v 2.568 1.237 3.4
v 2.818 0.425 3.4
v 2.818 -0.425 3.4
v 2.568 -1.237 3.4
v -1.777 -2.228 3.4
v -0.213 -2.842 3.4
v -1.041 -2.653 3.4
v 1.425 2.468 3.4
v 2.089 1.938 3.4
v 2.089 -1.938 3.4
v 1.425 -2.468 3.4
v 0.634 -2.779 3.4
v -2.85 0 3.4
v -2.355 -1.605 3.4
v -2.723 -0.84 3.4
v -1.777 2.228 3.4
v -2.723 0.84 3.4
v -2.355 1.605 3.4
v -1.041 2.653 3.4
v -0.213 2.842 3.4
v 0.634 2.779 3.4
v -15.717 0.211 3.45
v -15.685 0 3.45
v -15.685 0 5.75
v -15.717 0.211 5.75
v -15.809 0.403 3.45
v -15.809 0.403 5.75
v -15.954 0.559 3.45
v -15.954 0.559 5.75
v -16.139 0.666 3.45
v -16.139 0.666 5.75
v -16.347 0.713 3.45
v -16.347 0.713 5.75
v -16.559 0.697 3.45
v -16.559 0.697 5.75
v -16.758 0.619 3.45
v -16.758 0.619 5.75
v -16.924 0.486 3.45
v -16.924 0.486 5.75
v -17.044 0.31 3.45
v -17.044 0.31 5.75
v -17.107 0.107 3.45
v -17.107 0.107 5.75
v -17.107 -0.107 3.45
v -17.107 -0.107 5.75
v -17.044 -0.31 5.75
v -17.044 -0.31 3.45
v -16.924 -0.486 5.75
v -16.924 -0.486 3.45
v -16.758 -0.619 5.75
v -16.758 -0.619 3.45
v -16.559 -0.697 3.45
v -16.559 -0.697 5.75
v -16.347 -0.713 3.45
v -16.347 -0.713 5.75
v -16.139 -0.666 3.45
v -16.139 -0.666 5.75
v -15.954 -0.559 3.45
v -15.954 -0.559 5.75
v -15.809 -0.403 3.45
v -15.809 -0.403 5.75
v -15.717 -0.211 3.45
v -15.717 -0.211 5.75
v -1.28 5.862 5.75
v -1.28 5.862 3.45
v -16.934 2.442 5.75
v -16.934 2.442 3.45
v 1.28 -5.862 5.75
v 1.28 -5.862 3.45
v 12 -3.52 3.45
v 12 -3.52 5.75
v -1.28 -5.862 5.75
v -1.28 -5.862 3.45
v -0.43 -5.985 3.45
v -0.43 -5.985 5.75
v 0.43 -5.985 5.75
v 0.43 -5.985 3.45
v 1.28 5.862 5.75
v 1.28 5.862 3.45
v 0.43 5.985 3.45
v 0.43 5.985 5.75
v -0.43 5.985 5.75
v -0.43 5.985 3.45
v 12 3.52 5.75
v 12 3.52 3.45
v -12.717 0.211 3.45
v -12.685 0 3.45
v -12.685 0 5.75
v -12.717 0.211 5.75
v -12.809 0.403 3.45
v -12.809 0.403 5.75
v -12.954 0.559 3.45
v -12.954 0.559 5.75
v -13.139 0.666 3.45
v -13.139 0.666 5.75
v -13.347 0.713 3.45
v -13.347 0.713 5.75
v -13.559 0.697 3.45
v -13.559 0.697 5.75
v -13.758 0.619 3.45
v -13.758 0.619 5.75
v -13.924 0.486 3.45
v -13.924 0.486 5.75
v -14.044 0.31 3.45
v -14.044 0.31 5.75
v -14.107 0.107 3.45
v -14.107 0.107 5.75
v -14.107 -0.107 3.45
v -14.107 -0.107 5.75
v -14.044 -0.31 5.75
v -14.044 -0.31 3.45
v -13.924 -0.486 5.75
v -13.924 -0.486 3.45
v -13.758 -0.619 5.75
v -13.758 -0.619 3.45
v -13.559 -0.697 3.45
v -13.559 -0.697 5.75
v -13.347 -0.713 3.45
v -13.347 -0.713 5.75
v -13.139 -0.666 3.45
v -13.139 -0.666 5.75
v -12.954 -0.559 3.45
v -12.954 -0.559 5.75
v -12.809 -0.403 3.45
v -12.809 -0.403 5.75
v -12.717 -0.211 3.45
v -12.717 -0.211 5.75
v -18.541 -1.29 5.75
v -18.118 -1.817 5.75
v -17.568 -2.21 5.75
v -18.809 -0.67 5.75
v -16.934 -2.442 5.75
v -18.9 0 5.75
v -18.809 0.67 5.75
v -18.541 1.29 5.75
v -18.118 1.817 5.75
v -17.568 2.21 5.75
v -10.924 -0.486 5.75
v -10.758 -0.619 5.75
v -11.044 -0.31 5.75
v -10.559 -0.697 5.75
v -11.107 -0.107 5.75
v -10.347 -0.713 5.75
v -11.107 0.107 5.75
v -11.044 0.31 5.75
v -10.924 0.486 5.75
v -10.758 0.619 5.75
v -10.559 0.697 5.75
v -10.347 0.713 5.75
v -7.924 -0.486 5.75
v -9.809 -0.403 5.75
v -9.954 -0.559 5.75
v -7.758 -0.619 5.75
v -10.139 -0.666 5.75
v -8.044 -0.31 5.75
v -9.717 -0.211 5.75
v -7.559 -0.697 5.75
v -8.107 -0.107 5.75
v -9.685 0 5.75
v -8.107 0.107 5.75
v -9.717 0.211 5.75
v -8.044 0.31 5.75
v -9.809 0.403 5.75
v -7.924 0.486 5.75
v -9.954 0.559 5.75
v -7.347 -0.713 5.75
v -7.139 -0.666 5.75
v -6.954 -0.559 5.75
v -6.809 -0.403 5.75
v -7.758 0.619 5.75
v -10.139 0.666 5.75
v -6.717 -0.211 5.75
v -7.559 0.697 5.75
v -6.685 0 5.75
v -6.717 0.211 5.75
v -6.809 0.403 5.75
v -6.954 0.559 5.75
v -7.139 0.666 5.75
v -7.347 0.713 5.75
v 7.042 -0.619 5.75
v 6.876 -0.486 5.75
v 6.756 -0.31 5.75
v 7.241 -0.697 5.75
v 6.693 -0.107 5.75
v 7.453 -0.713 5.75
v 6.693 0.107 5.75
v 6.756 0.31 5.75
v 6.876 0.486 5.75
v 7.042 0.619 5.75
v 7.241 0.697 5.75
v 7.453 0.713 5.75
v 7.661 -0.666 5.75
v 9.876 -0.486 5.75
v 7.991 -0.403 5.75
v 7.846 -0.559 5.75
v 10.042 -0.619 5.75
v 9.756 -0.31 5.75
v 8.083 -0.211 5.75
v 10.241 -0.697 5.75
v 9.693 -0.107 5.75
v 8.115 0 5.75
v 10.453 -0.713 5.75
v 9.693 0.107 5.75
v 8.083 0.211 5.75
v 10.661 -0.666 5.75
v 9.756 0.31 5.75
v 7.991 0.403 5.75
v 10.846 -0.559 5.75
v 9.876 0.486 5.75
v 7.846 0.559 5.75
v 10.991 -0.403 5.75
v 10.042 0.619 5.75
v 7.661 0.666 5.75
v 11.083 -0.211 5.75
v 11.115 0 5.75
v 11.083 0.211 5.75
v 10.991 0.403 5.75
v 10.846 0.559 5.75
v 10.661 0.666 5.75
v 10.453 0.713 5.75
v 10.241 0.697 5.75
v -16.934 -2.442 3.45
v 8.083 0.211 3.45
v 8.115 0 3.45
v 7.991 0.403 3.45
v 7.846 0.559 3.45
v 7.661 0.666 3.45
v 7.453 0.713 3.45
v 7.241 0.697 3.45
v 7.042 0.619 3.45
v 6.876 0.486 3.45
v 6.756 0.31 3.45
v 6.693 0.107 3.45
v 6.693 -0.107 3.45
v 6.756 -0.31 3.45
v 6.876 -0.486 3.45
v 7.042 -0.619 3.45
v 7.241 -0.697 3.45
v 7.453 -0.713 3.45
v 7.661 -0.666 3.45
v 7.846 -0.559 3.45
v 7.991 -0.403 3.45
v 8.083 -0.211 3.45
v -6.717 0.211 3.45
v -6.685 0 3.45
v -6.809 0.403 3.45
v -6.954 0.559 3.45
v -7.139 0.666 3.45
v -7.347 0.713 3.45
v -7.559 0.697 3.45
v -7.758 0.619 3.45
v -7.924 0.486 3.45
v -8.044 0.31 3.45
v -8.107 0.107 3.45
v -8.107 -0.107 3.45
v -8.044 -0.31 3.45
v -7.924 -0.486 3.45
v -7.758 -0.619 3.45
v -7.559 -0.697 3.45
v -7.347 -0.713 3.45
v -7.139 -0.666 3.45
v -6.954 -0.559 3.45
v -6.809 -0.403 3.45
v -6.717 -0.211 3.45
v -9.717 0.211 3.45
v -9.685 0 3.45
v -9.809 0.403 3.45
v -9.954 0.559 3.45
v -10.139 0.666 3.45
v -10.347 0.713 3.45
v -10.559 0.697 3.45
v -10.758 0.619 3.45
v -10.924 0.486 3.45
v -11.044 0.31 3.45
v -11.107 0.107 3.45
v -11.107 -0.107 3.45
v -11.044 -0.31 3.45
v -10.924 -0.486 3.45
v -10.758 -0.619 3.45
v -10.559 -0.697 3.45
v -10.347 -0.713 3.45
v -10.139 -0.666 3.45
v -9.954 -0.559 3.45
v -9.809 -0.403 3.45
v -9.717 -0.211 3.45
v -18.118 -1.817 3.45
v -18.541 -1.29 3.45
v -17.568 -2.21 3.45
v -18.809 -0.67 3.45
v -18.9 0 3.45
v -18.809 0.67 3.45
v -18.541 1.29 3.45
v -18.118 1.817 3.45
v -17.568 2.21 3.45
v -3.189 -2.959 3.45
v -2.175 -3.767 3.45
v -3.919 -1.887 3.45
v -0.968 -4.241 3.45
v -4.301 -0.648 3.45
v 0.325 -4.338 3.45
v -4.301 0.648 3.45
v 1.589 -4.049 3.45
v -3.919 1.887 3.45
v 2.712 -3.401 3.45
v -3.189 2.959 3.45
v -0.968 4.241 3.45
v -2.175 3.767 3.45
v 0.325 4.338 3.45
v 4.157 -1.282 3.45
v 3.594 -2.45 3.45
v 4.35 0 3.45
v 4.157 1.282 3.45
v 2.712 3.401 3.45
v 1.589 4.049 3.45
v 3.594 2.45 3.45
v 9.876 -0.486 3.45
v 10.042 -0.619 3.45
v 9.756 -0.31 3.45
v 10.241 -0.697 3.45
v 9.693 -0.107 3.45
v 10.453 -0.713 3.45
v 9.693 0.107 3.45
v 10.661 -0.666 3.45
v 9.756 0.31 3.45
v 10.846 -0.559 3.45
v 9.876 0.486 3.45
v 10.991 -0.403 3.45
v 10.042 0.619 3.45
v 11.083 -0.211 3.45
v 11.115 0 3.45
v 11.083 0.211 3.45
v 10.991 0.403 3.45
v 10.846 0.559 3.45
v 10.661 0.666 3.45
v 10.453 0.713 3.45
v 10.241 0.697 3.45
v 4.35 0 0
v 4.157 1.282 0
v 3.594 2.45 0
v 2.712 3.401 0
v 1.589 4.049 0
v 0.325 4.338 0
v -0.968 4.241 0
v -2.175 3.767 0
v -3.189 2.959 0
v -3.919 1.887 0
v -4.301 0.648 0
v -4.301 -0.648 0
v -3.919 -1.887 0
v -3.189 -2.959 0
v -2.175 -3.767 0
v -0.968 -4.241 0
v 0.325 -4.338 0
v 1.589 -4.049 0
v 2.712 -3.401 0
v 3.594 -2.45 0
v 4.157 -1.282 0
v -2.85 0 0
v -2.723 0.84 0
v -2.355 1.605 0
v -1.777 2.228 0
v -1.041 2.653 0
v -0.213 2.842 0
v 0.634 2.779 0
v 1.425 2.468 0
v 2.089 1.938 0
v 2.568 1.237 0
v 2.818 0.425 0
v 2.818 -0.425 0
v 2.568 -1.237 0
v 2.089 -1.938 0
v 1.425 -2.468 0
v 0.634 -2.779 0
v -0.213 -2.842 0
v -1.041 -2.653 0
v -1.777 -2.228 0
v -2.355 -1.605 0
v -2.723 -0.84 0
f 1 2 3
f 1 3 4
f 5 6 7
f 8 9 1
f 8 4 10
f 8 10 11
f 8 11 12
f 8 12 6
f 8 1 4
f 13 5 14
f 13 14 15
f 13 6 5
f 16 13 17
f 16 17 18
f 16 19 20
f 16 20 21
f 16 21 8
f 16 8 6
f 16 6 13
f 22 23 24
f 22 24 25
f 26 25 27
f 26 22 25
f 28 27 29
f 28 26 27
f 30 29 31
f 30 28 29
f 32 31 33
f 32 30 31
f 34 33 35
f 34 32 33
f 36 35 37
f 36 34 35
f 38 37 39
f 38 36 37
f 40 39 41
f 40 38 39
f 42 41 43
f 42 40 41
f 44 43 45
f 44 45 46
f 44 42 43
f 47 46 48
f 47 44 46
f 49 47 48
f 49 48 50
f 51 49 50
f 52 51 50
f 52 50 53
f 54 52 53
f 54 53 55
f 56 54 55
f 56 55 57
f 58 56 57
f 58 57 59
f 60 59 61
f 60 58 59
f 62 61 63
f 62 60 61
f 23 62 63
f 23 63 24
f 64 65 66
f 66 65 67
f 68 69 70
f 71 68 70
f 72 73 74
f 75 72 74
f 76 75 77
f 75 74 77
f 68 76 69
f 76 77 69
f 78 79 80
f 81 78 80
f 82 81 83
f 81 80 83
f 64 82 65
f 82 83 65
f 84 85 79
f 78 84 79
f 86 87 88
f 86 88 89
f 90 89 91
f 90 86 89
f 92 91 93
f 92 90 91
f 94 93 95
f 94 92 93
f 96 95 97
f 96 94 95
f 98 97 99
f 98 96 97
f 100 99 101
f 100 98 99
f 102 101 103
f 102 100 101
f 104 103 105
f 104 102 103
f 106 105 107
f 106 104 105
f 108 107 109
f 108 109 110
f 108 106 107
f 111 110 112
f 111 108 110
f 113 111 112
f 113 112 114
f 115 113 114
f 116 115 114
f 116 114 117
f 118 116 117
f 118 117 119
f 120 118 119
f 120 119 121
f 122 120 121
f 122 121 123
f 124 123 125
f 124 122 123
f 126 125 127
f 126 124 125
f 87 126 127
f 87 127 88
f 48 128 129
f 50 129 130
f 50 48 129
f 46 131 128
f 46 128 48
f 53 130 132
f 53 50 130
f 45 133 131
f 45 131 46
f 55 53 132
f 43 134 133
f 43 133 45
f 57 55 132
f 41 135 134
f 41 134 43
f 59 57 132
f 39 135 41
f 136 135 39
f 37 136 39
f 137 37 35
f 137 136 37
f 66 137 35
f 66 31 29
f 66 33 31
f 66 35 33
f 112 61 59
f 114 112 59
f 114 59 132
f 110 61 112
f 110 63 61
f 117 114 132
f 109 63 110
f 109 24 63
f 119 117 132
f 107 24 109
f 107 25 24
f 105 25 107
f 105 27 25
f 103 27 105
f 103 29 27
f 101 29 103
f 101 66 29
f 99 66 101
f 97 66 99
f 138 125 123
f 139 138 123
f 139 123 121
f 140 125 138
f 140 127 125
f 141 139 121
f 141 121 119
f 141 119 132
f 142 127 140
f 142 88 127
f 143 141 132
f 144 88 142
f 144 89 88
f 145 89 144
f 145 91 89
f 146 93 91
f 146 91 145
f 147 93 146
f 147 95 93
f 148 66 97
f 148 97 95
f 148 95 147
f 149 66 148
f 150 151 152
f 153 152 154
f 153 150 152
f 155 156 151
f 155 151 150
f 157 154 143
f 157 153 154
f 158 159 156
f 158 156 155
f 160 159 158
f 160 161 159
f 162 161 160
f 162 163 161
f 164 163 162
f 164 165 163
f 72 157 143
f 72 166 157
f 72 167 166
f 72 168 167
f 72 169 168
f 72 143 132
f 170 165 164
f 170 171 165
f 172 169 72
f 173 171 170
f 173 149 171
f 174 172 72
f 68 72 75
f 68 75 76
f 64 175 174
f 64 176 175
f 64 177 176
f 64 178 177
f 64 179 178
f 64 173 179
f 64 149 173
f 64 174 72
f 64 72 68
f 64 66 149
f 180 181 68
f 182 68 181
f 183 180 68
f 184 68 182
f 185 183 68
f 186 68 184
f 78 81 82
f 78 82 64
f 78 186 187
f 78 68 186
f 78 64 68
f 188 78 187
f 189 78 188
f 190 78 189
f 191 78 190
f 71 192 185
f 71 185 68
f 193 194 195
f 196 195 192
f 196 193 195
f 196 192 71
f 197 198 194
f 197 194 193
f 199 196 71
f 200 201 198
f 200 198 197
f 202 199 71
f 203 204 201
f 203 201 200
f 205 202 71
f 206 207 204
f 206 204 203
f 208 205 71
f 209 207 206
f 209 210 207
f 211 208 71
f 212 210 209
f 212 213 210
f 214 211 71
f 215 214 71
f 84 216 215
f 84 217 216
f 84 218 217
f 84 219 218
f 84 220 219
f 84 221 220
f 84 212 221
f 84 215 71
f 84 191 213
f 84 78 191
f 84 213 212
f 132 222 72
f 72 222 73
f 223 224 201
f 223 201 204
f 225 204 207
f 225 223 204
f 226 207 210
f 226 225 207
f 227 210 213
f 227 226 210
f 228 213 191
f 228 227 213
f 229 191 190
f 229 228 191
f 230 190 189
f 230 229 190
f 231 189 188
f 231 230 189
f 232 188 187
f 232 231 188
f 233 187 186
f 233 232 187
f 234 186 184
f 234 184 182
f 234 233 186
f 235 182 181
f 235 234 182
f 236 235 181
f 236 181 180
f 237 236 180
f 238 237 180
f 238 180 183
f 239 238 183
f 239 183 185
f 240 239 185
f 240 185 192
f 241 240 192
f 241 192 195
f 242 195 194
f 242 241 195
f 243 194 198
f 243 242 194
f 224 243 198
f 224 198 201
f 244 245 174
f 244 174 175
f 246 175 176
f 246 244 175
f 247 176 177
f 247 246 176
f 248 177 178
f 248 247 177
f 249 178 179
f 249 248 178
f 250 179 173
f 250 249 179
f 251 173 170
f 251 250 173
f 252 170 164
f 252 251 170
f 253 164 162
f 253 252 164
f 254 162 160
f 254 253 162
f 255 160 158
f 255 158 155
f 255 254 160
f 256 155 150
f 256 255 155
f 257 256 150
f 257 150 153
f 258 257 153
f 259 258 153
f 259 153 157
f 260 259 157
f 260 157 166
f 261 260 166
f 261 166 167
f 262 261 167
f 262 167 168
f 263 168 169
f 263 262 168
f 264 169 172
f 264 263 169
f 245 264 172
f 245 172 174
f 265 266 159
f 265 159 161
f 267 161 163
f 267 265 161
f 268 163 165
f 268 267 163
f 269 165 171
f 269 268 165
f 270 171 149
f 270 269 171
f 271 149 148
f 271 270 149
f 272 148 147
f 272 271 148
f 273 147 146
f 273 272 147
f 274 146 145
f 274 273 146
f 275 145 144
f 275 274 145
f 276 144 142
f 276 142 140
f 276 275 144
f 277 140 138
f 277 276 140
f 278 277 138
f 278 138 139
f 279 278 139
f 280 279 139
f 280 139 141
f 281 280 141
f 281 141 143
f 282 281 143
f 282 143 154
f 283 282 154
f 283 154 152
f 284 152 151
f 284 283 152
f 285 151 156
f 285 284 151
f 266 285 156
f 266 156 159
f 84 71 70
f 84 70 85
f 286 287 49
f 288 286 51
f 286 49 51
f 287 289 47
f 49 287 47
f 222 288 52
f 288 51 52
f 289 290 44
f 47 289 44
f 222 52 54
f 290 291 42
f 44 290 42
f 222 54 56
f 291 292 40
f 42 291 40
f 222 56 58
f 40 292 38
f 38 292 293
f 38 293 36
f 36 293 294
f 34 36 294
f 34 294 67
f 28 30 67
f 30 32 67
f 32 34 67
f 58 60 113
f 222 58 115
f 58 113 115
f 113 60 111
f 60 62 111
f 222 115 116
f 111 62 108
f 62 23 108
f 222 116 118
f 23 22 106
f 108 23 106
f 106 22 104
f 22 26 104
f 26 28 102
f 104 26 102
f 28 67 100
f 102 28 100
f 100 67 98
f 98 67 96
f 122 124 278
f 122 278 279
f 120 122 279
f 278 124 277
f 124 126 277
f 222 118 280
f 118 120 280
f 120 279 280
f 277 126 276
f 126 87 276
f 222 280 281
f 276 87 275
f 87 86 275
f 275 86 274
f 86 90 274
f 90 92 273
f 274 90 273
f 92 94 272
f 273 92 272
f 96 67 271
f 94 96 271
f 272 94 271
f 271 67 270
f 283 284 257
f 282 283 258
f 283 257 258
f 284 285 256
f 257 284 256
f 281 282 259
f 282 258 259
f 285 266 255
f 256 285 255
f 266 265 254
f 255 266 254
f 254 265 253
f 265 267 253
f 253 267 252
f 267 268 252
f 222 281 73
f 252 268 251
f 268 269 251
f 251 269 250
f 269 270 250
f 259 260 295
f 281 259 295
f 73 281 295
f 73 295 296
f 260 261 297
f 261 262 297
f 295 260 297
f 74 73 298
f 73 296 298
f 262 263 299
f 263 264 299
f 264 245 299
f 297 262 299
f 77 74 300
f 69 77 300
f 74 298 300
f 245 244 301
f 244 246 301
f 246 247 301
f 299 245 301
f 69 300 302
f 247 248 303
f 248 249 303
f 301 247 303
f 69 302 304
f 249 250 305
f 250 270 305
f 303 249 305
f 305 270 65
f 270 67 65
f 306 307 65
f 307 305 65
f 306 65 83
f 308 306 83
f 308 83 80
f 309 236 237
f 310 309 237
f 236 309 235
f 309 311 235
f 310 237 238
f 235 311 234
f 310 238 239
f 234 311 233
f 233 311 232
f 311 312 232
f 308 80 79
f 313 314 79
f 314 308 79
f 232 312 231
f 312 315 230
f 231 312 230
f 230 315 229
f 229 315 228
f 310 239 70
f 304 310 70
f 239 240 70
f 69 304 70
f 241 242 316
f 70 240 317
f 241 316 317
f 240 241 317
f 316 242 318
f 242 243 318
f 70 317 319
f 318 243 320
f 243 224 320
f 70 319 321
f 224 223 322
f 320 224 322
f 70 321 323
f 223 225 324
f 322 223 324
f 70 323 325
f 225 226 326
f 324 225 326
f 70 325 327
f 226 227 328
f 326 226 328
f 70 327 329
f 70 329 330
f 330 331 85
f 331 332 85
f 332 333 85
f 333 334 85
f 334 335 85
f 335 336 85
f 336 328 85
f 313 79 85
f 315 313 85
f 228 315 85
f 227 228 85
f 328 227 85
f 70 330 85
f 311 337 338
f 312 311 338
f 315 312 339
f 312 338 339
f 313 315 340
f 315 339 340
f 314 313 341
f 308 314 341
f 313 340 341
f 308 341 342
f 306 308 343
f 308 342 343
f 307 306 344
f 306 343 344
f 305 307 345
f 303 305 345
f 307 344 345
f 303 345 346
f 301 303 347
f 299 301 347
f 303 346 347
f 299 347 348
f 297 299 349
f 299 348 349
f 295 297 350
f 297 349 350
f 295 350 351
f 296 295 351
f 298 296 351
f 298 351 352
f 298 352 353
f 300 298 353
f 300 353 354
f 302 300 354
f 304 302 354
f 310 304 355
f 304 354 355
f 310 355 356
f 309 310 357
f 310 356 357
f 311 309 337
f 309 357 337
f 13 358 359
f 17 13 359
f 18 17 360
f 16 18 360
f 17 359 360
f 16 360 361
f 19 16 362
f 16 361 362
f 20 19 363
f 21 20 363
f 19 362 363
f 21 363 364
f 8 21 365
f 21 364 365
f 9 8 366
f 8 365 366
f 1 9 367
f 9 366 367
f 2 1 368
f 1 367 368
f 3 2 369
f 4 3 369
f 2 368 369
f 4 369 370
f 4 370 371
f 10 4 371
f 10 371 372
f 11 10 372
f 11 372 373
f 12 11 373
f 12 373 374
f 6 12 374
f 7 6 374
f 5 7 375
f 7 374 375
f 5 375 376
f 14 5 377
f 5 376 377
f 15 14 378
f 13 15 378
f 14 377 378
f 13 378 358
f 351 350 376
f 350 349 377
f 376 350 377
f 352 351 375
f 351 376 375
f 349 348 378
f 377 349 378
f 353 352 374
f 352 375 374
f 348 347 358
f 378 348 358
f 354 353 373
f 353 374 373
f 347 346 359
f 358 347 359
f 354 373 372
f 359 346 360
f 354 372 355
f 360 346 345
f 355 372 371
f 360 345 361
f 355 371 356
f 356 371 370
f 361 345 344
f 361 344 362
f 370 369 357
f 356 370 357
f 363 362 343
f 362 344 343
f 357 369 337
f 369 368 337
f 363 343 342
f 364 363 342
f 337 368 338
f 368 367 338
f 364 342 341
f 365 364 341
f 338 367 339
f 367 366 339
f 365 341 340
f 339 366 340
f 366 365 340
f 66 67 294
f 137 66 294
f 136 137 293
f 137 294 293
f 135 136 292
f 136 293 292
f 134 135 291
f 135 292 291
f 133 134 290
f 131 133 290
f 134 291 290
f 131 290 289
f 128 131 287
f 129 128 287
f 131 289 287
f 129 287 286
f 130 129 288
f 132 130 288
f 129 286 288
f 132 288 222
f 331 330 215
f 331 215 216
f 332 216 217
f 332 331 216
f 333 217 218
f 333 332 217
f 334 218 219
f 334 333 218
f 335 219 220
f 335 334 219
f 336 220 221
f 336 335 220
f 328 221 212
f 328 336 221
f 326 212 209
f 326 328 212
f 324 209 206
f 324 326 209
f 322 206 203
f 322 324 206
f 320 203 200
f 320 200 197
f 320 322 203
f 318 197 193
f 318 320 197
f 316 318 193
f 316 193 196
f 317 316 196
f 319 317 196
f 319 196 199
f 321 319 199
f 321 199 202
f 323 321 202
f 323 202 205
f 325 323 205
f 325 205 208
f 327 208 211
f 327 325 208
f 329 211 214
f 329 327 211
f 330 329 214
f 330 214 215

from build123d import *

# Parameters (mm, degrees)
SKETCH_1_R          = 4.35
EXTRUDE_1_DEPTH     = 3.45
SKETCH_2_R          = 0.715
EXTRUDE_2_DEPTH     = 2.3
SKETCH_3_R          = 2.85
CUT_EXTRUDE_1_DEPTH = 3.4
SKETCH_4_W          = 12.90394782
SKETCH_4_H          = 10.561384984
CUT_EXTRUDE_2_DEPTH = 10


with BuildPart() as part:
    # 草图1 → 凸台-拉伸1 (new body)
    with BuildSketch(Plane.XY):
        Circle(SKETCH_1_R)
    extrude(amount=EXTRUDE_1_DEPTH)

    # 草图2 → 凸台-拉伸2 (add)
    with BuildSketch(Plane.XY.offset(3.45)):
        with BuildLine():
            Line((-1.280487805, 5.861770294), (-16.933536585, 2.442404289))
            ThreePointArc((-16.933536585, 2.442404289), (-18.9, 0), (-16.933536585, -2.442404289))
            Line((-16.933536585, -2.442404289), (-1.280487805, -5.861770294))
            ThreePointArc((-1.280487805, -5.861770294), (0, -6), (1.280487805, -5.861770294))
            Line((1.280487805, -5.861770294), (16.933536585, -2.442404289))
            ThreePointArc((16.933536585, -2.442404289), (18.9, 0), (16.933536585, 2.442404289))
            Line((16.933536585, 2.442404289), (1.280487805, 5.861770294))
            ThreePointArc((1.280487805, 5.861770294), (0, 6), (-1.280487805, 5.861770294))
        make_face()
        with Locations((-16.4, 0)):
            Circle(SKETCH_2_R, mode=Mode.SUBTRACT)
        with Locations((-13.4, 0)):
            Circle(SKETCH_2_R, mode=Mode.SUBTRACT)
        with Locations((-10.4, 0)):
            Circle(SKETCH_2_R, mode=Mode.SUBTRACT)
        with Locations((-7.4, 0)):
            Circle(SKETCH_2_R, mode=Mode.SUBTRACT)
        with Locations((7.4, 0)):
            Circle(SKETCH_2_R, mode=Mode.SUBTRACT)
        with Locations((10.4, 0)):
            Circle(SKETCH_2_R, mode=Mode.SUBTRACT)
        with Locations((13.4, 0)):
            Circle(SKETCH_2_R, mode=Mode.SUBTRACT)
        with Locations((16.4, 0)):
            Circle(SKETCH_2_R, mode=Mode.SUBTRACT)
    extrude(amount=EXTRUDE_2_DEPTH)

    # 草图3 → 切除-拉伸1 (cut)
    with BuildSketch(Plane(origin=(0, 0, 0), x_dir=(-1, 0, 0), z_dir=(0, 0, -1))):
        Circle(SKETCH_3_R)
    extrude(amount=-CUT_EXTRUDE_1_DEPTH, mode=Mode.SUBTRACT)

    # 草图4 → 切除-拉伸2 (cut)
    with BuildSketch(Plane.XY.offset(5.75)):
        with Locations((18.45197391, -0.575714595)):
            Rectangle(SKETCH_4_W, SKETCH_4_H)
    extrude(amount=-CUT_EXTRUDE_2_DEPTH, mode=Mode.SUBTRACT)


solid = part.part
